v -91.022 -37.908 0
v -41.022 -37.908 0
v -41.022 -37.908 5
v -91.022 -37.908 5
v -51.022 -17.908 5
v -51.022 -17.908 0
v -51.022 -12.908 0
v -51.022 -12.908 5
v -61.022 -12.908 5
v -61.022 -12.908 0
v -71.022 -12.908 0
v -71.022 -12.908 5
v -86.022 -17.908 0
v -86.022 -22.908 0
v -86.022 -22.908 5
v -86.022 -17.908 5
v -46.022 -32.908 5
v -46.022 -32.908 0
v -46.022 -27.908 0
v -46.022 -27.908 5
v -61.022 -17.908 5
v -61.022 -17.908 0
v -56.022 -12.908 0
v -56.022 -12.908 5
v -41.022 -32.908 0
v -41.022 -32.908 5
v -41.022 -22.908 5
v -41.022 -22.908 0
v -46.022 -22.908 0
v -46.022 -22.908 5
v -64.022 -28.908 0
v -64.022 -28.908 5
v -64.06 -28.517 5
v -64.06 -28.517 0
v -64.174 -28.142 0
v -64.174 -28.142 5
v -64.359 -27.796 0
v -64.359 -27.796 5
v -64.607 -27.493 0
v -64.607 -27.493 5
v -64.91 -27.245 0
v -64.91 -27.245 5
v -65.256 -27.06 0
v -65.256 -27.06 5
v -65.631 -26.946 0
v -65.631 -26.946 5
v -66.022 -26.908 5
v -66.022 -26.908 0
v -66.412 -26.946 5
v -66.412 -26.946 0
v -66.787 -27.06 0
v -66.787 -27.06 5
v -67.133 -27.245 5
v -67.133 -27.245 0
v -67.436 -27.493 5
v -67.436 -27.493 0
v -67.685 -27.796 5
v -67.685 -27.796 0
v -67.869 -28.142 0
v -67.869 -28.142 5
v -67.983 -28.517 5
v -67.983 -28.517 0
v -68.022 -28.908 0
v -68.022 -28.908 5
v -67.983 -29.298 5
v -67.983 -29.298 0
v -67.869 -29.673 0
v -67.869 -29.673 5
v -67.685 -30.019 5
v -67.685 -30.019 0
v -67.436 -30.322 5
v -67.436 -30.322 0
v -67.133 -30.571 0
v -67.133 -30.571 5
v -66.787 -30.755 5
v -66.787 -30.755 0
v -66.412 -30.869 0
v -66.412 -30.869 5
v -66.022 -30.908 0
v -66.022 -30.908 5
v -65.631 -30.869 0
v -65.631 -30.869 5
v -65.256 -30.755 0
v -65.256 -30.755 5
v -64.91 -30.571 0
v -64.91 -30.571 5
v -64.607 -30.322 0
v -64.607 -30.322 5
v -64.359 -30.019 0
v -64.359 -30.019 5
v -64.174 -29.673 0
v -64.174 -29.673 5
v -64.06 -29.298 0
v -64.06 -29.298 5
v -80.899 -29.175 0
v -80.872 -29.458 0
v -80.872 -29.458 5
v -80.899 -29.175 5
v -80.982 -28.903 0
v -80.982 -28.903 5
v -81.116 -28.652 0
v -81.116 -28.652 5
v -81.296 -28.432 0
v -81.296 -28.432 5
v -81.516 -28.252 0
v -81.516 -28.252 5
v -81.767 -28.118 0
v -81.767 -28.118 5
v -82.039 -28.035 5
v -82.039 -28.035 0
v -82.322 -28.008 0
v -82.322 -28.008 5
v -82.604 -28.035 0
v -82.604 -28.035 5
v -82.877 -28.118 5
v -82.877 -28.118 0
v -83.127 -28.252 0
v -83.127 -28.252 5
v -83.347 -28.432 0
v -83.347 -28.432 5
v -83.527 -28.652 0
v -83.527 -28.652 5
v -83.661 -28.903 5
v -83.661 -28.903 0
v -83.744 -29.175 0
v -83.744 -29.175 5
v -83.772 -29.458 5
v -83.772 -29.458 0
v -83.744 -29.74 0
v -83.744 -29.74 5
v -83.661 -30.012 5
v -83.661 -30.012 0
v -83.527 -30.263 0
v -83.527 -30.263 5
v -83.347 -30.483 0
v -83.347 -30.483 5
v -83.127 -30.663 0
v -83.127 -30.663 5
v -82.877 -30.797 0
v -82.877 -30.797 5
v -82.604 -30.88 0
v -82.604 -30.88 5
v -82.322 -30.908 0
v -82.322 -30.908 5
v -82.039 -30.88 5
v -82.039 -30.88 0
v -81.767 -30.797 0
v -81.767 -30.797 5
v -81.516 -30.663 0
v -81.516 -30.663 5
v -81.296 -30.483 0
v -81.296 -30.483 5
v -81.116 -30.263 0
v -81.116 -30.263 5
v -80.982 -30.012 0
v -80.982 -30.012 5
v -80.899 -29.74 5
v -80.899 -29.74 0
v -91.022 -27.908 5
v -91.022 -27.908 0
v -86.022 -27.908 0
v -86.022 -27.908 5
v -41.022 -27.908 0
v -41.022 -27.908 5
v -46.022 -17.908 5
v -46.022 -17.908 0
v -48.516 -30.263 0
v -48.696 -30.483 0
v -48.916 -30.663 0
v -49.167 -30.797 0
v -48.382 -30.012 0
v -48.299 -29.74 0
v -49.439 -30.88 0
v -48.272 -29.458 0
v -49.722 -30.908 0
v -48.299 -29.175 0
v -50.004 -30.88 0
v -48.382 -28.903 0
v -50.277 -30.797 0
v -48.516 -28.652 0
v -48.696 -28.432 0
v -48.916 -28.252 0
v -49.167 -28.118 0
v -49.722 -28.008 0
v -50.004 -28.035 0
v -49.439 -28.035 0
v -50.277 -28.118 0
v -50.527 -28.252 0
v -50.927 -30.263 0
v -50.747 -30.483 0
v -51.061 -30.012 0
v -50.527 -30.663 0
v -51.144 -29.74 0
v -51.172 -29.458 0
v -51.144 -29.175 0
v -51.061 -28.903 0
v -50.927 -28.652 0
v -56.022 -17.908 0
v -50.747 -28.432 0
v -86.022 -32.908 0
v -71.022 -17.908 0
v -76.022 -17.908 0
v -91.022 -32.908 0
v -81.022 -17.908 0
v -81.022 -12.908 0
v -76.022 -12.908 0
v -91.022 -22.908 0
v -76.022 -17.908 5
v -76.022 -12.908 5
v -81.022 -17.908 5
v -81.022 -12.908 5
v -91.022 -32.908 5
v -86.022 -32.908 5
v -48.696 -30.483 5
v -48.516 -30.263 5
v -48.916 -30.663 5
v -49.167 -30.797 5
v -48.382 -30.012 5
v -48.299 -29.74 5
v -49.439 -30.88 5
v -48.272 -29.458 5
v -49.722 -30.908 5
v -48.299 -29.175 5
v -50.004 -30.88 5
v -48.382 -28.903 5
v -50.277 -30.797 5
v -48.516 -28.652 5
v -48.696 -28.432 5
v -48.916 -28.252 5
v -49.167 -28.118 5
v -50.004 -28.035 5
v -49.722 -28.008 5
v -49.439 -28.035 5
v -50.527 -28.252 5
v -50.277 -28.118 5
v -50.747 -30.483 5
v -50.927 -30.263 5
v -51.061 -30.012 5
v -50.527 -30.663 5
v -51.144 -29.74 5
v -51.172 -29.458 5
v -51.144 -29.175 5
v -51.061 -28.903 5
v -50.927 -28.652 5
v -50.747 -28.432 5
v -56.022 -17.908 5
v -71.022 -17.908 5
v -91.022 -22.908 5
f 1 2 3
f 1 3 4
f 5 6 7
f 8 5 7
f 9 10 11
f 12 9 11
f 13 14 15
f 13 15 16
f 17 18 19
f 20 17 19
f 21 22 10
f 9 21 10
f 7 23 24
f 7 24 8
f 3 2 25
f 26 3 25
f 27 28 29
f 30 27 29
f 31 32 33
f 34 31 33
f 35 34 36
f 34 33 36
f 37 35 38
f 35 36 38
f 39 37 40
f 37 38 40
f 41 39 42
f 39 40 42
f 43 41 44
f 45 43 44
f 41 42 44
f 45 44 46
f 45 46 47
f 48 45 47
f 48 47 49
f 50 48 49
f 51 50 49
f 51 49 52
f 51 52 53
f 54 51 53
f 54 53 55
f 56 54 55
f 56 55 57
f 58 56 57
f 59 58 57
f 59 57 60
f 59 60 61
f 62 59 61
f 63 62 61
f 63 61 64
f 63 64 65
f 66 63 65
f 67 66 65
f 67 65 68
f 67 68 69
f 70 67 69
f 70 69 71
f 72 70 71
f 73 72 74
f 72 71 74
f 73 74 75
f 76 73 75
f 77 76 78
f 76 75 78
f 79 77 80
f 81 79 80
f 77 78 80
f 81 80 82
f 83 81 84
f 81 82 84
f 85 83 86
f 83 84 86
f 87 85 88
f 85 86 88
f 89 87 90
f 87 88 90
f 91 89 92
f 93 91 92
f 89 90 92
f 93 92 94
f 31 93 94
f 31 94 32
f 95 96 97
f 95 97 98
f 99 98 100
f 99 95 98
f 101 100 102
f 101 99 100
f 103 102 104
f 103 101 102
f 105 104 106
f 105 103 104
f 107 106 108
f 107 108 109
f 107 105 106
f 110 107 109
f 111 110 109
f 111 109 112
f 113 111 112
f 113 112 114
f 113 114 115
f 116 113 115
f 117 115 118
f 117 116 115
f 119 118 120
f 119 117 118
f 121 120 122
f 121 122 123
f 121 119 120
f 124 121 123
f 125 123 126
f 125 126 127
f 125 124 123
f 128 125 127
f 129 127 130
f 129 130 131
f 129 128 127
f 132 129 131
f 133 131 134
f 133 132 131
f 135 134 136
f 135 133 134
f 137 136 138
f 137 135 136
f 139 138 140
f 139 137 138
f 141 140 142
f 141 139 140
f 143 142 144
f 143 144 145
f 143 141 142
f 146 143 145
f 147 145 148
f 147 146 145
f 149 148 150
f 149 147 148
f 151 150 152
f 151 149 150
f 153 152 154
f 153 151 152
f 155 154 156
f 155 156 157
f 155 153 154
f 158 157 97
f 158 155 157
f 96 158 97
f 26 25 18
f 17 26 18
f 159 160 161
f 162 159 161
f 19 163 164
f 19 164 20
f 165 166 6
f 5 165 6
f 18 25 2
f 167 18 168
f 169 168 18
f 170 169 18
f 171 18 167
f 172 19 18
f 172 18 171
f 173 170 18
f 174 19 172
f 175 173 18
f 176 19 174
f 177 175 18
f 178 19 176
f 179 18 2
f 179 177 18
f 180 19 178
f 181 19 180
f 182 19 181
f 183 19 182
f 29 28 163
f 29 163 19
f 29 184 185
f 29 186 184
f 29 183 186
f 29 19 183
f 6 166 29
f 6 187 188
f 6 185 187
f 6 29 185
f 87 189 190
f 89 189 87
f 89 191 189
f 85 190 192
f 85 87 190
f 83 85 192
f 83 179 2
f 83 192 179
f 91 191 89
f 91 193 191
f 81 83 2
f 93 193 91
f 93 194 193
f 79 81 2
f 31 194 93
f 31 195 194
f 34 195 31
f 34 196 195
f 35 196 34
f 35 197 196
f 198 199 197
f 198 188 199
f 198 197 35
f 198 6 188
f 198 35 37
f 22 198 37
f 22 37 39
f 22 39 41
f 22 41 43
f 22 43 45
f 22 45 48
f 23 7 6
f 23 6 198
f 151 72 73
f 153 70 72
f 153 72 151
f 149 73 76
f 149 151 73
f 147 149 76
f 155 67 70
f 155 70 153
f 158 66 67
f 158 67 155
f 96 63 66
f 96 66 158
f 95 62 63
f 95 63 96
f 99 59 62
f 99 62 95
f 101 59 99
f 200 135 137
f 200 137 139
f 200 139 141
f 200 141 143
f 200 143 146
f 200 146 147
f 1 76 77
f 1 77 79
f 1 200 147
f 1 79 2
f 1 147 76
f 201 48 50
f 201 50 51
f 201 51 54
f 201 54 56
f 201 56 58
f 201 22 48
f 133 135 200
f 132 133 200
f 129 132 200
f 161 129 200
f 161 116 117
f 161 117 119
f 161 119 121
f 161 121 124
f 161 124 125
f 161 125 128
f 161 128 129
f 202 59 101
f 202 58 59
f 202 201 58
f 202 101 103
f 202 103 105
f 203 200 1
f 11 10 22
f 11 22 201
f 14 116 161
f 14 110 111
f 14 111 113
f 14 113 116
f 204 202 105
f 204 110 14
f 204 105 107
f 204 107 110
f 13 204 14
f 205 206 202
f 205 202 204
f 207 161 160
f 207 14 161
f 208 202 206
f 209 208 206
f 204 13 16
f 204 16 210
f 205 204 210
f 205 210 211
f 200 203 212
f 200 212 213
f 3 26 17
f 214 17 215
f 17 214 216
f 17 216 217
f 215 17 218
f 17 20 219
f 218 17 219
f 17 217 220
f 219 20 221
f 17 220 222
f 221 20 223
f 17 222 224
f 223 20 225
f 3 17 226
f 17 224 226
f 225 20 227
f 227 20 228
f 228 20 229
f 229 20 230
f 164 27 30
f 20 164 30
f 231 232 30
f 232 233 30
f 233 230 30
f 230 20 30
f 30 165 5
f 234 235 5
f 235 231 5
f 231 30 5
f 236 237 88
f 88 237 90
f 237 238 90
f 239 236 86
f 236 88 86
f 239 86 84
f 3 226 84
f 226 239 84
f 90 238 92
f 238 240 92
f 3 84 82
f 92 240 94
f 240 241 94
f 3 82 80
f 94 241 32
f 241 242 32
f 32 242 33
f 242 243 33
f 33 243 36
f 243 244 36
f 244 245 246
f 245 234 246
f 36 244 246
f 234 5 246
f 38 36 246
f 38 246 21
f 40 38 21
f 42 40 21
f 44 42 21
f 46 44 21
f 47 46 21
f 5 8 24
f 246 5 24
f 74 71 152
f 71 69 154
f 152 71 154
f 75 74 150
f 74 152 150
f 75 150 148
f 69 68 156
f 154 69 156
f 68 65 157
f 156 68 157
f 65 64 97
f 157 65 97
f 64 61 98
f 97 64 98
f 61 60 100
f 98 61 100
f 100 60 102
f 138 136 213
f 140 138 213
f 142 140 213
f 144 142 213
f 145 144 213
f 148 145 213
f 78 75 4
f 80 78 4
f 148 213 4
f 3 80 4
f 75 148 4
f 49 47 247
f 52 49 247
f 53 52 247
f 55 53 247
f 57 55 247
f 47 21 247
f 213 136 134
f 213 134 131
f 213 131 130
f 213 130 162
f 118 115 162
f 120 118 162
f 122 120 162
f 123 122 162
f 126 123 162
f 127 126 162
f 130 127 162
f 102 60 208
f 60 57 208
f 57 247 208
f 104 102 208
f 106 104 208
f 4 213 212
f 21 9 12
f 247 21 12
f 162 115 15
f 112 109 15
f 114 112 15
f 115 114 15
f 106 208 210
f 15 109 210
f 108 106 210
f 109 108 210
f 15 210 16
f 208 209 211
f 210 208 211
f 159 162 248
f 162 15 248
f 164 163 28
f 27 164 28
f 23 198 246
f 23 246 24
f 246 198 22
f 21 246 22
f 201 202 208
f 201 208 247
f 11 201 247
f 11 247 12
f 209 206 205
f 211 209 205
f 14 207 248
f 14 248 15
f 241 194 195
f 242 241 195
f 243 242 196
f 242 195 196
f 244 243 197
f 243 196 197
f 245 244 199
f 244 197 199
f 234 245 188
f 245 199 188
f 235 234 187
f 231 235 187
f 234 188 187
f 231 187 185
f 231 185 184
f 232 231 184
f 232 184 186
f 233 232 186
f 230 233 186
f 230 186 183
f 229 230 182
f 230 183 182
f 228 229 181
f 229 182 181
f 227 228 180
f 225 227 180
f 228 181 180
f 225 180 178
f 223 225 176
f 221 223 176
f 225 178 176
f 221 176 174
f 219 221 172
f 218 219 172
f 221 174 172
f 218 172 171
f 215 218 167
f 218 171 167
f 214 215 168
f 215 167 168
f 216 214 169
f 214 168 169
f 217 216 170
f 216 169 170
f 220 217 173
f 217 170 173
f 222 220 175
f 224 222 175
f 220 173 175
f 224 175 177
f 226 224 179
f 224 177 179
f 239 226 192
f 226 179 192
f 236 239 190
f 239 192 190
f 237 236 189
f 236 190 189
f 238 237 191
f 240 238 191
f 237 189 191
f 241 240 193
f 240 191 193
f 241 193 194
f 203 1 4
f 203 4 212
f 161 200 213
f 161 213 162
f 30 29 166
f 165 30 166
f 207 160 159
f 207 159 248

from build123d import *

# Parameters (mm, degrees)
ESQUISSE1_W             = 25
ESQUISSE1_H             = 25
BOSS_EXTRU_1_DEPTH      = 5
ESQUISSE3_R             = 1.45
ESQUISSE3_W             = 5
ESQUISSE3_H             = 5
ENL_V_MAT_EXTRU_1_DEPTH = 5
ESQUISSE5_R             = 2
ENL_V_MAT_EXTRU_2_DEPTH = 10


with BuildPart() as part:
    # Esquisse1 → Boss.-Extru.1 (new body)
    with BuildSketch(Plane.XY):
        with Locations((-53.521610088, -25.407575758)):
            Rectangle(ESQUISSE1_W, ESQUISSE1_H)
    boss_extru_1 = extrude(amount=BOSS_EXTRU_1_DEPTH)

    # Esquisse3 → Enlèv. mat.-Extru.1 (cut)
    with BuildSketch(Plane(origin=(0, 0, 0), x_dir=(-1, 0, 0), z_dir=(0, 0, -1))):
        with Locations((49.721610088, -29.457575758)):
            Circle(ESQUISSE3_R)
        Polygon((46.021610088, -22.907575758), (46.021610088, -17.907575758), (51.021610088, -17.907575758), (51.021610088, -12.907575758), (41.021610088, -12.907575758), (41.021610088, -22.907575758), align=None)
        with Locations((43.521610088, -30.407575758)):
            Rectangle(ESQUISSE3_W, ESQUISSE3_H)
        with Locations((58.521610088, -15.407575758)):
            Rectangle(ESQUISSE3_W, ESQUISSE3_H)
    enl_v_mat_extru_1 = extrude(amount=-ENL_V_MAT_EXTRU_1_DEPTH, mode=Mode.SUBTRACT)

    # Symétrie1: Boss.-Extru.1, Enlèv. mat.-Extru.1 across plane
    add(boss_extru_1.mirror(Plane(origin=(-66.021610088, -12.907575758, 5), x_dir=(0, 0, 1), z_dir=(1, 0, 0))))
    add(enl_v_mat_extru_1.mirror(Plane(origin=(-66.021610088, -12.907575758, 5), x_dir=(0, 0, 1), z_dir=(1, 0, 0))), mode=Mode.SUBTRACT)

    # Esquisse5 → Enlèv. mat.-Extru.2 (cut)
    with BuildSketch(Plane.XY.offset(5)):
        with Locations((-66.021610088, -28.907575758)):
            Circle(ESQUISSE5_R)
    extrude(amount=-ENL_V_MAT_EXTRU_2_DEPTH, mode=Mode.SUBTRACT)


solid = part.part
